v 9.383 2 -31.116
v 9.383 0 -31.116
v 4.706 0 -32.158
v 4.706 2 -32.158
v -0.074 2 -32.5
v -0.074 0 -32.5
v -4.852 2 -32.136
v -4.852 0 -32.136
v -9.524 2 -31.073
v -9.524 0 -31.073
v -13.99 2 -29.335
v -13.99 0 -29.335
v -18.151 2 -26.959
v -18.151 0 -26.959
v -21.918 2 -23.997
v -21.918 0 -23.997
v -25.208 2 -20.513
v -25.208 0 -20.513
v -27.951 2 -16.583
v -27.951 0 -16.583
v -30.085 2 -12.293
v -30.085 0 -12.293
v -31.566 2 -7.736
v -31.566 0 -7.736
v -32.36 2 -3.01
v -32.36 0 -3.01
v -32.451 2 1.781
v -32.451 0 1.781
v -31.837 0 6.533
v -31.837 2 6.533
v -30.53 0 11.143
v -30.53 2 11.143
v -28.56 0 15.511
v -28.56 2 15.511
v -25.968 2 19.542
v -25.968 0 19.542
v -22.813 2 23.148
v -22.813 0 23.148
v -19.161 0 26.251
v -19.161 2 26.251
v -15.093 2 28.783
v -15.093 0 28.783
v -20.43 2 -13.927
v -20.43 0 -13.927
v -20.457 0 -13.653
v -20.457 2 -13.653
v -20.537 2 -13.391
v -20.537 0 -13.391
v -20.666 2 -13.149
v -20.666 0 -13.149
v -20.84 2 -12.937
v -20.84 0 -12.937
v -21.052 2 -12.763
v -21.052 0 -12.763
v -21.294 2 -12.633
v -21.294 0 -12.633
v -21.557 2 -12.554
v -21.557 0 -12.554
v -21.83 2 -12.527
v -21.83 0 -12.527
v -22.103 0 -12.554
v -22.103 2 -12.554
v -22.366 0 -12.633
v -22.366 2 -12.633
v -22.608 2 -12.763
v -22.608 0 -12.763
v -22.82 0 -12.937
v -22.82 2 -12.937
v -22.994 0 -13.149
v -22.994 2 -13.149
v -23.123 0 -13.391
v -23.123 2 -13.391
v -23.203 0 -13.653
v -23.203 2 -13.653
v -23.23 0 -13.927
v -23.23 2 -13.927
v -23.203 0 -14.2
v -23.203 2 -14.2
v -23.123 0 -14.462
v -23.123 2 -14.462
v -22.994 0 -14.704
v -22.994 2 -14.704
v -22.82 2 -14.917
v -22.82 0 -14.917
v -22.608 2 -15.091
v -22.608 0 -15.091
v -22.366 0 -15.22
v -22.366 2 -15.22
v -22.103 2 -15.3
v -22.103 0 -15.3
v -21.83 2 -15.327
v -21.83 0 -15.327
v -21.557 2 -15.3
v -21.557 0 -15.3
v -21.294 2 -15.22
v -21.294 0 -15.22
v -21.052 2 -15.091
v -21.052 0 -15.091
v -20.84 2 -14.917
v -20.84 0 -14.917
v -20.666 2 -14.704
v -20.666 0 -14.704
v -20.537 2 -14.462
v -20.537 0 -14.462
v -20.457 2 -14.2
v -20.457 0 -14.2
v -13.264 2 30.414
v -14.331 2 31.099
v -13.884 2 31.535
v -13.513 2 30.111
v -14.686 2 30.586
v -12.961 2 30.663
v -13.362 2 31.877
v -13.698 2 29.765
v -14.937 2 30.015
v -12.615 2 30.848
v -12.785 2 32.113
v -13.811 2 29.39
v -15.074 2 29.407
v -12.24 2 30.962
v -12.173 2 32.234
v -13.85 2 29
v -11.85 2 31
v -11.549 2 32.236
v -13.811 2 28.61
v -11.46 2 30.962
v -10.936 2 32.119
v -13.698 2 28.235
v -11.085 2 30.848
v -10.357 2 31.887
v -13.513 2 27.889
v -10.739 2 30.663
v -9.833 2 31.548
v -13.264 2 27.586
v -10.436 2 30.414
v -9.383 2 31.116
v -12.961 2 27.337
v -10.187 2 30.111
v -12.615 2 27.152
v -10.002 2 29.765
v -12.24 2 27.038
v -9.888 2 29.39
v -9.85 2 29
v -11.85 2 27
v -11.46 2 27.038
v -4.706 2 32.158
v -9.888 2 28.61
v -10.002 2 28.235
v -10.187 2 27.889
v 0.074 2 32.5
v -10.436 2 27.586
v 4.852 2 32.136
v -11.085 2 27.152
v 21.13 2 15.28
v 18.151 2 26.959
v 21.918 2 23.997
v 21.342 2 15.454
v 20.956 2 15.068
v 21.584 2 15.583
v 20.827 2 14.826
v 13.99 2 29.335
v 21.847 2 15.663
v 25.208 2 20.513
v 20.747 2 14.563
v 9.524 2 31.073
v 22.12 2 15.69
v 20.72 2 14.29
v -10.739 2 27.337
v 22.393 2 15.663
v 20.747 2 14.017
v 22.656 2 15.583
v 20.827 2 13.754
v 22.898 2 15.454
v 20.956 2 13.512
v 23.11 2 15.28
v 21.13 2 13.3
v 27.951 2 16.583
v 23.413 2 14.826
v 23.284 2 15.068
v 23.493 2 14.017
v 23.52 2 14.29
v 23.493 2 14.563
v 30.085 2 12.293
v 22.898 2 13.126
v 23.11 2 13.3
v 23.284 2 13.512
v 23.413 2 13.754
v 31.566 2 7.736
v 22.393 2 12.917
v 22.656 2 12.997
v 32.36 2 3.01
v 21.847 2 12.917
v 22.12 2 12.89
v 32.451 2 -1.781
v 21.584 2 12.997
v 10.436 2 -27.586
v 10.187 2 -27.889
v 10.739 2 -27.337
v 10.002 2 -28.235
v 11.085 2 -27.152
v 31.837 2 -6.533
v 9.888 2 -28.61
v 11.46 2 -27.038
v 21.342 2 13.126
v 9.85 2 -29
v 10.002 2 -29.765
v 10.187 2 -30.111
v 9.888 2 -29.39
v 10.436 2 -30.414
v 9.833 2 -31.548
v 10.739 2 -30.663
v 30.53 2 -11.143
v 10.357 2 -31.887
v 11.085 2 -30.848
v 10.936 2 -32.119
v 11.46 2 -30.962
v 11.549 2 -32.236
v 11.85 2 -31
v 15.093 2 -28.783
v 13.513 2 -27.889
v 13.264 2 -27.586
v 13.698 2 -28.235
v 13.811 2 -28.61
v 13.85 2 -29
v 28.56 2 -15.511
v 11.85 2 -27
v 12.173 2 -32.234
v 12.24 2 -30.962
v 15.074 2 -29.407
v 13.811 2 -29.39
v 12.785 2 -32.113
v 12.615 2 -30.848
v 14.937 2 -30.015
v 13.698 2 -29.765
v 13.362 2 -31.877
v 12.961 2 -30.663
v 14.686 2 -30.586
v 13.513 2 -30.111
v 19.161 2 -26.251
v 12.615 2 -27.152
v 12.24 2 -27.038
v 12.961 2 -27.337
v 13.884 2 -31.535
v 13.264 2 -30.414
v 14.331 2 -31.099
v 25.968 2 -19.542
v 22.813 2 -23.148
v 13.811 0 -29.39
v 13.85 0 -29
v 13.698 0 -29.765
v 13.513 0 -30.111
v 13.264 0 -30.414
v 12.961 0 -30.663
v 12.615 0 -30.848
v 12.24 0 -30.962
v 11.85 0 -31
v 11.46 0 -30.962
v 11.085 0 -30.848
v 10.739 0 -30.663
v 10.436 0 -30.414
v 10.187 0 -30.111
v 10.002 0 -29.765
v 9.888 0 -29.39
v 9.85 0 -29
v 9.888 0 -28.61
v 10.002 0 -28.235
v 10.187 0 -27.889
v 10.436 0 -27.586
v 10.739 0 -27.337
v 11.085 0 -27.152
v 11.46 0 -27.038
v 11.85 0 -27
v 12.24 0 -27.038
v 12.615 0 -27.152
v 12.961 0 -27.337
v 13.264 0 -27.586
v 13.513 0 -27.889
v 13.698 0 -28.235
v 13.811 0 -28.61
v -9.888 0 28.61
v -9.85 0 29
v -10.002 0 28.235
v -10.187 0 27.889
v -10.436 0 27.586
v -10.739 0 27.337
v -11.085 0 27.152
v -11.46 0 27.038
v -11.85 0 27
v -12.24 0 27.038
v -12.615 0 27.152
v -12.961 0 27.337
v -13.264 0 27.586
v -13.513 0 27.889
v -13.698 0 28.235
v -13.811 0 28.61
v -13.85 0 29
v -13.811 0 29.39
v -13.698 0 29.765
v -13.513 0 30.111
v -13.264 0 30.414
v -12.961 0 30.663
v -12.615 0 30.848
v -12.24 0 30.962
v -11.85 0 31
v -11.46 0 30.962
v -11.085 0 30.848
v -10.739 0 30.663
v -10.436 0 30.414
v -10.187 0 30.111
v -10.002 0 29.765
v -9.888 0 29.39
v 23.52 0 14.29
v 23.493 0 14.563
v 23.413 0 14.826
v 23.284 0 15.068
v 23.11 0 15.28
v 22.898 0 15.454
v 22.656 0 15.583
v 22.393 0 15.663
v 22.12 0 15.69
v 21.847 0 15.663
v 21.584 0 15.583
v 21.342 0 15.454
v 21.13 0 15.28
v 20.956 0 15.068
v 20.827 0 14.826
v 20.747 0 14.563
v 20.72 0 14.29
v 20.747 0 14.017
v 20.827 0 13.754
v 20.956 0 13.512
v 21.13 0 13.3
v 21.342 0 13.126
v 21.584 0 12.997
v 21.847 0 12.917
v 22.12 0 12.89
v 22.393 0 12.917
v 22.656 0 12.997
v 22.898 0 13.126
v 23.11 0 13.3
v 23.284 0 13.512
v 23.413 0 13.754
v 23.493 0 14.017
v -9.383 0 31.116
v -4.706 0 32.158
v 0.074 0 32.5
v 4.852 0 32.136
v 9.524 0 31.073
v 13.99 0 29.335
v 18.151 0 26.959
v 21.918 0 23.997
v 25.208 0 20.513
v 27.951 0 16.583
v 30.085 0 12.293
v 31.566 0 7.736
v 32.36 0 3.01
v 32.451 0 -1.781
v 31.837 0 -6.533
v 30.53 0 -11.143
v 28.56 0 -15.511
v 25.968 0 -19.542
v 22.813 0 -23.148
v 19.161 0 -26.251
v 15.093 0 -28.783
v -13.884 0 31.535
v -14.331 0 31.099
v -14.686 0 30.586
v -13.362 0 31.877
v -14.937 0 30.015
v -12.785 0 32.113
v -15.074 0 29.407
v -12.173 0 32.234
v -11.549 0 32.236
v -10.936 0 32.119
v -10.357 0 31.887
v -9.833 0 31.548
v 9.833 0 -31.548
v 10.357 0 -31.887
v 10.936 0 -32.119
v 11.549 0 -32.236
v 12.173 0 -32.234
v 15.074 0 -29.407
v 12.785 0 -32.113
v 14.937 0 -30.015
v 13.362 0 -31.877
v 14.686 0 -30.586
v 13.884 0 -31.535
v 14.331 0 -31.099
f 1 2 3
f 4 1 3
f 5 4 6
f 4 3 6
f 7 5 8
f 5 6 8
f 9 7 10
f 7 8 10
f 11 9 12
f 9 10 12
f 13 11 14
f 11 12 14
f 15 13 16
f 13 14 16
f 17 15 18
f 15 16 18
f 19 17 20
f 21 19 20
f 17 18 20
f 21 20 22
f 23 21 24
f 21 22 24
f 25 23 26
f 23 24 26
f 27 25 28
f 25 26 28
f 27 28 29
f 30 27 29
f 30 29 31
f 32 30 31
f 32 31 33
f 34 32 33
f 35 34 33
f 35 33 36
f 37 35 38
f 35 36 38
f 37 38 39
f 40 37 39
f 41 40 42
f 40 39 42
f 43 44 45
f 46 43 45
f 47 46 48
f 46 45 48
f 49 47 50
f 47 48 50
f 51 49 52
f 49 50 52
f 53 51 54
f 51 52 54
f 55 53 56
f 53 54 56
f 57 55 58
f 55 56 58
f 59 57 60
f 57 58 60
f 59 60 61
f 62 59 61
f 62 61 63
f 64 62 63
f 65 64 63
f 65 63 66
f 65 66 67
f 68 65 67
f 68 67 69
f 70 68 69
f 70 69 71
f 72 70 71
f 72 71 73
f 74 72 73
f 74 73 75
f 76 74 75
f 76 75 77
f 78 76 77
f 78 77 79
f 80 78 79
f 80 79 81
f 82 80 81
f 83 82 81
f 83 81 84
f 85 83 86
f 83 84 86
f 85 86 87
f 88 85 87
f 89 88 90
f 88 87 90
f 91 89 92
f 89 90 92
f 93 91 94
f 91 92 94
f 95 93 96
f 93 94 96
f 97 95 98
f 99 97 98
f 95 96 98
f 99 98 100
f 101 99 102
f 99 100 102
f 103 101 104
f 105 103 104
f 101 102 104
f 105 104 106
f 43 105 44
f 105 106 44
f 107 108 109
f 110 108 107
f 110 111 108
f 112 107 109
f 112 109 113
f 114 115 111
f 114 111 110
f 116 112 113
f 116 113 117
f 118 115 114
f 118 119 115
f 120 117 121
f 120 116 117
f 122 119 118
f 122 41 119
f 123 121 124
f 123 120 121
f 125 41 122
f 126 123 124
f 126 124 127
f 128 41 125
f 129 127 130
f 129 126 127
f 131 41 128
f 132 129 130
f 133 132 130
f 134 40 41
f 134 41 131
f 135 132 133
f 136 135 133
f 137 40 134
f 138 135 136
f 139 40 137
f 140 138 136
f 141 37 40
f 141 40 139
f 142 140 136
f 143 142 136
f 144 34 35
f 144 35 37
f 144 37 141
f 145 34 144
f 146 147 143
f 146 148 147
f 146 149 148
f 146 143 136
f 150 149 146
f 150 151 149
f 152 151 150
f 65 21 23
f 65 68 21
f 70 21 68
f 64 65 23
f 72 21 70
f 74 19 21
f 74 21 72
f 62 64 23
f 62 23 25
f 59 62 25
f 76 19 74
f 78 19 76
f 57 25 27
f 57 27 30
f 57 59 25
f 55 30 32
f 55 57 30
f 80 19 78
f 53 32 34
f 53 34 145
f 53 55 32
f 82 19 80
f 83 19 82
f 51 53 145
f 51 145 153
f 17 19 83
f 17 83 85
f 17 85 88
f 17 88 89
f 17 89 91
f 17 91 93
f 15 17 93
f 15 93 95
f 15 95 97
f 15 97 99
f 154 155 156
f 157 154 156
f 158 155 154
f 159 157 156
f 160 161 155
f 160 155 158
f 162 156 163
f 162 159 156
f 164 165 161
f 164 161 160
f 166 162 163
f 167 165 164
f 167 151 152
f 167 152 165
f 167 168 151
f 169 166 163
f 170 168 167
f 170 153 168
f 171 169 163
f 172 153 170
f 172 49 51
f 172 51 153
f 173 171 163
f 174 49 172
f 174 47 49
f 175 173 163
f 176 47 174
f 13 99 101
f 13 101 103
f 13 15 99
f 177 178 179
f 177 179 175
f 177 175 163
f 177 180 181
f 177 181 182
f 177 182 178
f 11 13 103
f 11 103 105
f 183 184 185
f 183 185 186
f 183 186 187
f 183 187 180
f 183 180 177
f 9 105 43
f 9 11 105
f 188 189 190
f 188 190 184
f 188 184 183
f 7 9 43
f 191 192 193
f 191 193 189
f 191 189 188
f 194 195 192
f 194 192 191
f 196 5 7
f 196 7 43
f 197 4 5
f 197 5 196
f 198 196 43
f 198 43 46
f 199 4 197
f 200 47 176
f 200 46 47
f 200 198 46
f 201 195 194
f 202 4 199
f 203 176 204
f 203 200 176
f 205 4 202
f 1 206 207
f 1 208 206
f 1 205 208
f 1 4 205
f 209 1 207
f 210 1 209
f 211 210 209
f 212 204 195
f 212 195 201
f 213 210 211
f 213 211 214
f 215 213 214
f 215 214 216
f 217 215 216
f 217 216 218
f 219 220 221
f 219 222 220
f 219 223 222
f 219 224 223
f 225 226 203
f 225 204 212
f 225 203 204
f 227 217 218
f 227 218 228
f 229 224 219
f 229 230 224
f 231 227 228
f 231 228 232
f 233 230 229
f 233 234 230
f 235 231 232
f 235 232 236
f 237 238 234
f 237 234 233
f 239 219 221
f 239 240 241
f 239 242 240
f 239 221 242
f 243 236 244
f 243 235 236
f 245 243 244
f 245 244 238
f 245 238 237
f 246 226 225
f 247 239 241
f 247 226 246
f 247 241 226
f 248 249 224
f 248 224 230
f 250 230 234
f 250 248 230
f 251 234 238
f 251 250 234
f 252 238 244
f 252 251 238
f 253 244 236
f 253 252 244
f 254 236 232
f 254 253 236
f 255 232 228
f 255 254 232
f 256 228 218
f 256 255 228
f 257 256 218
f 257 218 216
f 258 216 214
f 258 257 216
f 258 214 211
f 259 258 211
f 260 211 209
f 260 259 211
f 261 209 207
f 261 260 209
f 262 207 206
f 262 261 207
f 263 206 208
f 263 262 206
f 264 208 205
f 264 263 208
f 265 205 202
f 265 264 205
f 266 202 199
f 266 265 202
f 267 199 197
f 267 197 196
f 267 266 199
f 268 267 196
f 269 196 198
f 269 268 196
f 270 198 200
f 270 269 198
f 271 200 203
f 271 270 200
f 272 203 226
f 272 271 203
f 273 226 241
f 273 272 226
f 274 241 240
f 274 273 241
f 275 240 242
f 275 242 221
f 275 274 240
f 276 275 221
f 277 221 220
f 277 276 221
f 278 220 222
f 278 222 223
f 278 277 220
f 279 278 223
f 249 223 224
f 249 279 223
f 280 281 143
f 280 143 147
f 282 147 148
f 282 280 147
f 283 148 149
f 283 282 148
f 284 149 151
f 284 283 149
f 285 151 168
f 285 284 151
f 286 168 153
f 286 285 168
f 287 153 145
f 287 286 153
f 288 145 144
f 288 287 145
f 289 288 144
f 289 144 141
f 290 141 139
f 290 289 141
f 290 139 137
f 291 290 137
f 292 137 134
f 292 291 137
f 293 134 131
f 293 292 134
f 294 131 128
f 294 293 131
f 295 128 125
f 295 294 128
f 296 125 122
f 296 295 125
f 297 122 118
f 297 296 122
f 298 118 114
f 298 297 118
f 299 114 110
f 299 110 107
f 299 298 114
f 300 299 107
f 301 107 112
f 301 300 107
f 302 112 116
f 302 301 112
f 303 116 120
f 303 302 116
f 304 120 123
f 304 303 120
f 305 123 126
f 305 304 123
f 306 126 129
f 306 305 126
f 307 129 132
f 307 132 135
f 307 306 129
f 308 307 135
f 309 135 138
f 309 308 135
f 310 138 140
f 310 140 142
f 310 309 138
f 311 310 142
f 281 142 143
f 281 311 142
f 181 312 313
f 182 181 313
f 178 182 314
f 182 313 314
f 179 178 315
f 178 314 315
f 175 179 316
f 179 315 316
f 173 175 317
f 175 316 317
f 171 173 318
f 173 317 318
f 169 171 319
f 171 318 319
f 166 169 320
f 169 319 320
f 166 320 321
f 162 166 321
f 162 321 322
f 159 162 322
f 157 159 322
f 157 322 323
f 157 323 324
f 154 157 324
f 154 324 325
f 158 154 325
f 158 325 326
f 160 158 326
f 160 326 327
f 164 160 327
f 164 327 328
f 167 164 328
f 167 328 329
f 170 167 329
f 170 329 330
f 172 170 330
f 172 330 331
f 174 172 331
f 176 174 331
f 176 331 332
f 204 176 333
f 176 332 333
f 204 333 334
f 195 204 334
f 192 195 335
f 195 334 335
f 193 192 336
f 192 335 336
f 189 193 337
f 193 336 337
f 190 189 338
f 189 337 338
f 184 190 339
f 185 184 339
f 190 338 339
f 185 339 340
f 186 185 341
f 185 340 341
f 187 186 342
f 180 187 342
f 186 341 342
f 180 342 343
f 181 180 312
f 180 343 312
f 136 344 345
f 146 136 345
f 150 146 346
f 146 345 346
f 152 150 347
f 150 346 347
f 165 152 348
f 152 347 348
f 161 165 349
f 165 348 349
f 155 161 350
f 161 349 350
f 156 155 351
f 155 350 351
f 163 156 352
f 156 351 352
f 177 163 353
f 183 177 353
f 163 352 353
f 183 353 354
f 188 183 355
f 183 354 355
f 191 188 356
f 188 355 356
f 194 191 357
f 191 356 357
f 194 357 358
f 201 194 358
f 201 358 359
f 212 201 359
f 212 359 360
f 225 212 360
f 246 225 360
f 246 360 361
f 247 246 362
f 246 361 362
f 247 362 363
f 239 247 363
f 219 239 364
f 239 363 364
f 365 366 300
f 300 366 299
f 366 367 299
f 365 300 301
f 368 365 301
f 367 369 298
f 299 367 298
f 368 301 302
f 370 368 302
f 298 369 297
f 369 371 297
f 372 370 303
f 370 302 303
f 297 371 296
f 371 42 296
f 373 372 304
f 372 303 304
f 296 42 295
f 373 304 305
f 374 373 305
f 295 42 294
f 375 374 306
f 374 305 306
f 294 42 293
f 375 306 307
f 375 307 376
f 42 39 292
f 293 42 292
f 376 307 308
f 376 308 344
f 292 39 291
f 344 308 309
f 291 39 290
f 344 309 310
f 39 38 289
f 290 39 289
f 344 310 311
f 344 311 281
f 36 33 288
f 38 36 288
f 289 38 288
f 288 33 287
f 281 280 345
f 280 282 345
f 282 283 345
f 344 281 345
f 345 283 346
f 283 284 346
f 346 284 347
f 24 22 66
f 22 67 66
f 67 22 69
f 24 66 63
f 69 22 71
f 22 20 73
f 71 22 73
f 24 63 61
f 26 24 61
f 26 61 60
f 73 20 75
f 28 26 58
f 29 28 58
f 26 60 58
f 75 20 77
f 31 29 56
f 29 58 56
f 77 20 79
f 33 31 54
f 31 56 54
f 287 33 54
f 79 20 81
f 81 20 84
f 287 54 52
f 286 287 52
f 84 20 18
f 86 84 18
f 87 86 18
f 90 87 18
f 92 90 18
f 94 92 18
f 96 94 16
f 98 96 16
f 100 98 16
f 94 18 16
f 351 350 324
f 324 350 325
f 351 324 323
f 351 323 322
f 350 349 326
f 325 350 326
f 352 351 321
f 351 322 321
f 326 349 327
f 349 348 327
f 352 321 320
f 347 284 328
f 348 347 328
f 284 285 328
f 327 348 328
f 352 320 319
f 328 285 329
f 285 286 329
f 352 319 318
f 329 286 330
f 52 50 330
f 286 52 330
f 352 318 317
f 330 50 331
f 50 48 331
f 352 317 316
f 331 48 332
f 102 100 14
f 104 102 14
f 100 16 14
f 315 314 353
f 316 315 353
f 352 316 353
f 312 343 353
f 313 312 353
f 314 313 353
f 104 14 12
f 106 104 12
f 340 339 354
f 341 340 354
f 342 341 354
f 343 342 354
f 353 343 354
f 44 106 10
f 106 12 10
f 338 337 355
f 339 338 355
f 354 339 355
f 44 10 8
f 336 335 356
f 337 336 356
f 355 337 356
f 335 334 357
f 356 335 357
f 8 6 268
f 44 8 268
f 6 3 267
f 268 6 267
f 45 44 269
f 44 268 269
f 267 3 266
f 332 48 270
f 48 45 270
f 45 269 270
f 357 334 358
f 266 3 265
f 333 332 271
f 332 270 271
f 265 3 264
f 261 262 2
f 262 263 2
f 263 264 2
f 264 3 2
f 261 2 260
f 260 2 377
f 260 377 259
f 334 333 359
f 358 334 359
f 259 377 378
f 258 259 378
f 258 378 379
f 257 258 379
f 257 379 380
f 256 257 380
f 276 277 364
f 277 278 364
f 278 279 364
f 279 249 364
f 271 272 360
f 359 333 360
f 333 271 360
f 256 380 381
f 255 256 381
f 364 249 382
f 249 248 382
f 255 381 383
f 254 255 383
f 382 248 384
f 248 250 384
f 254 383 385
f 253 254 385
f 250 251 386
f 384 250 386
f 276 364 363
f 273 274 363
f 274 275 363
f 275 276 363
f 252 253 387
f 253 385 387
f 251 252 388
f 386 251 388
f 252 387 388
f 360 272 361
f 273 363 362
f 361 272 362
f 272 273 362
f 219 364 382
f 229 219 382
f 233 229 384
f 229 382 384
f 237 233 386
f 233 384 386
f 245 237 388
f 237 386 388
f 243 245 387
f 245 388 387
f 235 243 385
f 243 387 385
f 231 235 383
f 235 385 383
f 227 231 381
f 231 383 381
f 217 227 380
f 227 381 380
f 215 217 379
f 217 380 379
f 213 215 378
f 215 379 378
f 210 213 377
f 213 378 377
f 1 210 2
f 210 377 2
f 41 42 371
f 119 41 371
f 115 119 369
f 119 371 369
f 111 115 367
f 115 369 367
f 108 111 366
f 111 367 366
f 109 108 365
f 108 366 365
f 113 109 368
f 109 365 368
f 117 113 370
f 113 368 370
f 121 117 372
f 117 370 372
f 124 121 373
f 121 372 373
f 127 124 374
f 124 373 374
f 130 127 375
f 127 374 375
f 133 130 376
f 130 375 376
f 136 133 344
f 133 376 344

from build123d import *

# Parameters (mm, degrees)
SKETCH1_R           = 2
BOSS_EXTRUDE1_DEPTH = 2
SKETCH6_R           = 1.4
CUT_EXTRUDE1_DEPTH  = 10


with BuildPart() as part:
    # Sketch1 → Boss-Extrude1 (new body)
    with BuildSketch(Plane(origin=(0, 0, 0), x_dir=(1, 0, 0), z_dir=(0, 1, 0))):
        with BuildLine():
            ThreePointArc((9.383115236, 31.116027196), (-30.08527478, 12.293341344), (-15.092629238, -28.783025253))
            ThreePointArc((-15.092629238, -28.783025253), (-13.079214236, -32.008527478), (-9.383115236, -31.116027196))
            ThreePointArc((-9.383115236, -31.116027196), (30.08527478, -12.293341344), (15.092629238, 28.783025253))
            ThreePointArc((15.092629238, 28.783025253), (13.079214236, 32.008527478), (9.383115236, 31.116027196))
        make_face()
        with Locations((11.849880102, 29)):
            Circle(SKETCH1_R, mode=Mode.SUBTRACT)
        with Locations((-11.849880102, -29)):
            Circle(SKETCH1_R, mode=Mode.SUBTRACT)
    extrude(amount=BOSS_EXTRUDE1_DEPTH)

    # Sketch6 → Cut-Extrude1 (cut)
    with BuildSketch(Plane.XZ):
        with Locations((-21.83, -13.926611625)):
            Circle(SKETCH6_R)
        with Locations((22.12, 14.29)):
            Circle(SKETCH6_R)
    extrude(amount=-CUT_EXTRUDE1_DEPTH, mode=Mode.SUBTRACT)


solid = part.part
